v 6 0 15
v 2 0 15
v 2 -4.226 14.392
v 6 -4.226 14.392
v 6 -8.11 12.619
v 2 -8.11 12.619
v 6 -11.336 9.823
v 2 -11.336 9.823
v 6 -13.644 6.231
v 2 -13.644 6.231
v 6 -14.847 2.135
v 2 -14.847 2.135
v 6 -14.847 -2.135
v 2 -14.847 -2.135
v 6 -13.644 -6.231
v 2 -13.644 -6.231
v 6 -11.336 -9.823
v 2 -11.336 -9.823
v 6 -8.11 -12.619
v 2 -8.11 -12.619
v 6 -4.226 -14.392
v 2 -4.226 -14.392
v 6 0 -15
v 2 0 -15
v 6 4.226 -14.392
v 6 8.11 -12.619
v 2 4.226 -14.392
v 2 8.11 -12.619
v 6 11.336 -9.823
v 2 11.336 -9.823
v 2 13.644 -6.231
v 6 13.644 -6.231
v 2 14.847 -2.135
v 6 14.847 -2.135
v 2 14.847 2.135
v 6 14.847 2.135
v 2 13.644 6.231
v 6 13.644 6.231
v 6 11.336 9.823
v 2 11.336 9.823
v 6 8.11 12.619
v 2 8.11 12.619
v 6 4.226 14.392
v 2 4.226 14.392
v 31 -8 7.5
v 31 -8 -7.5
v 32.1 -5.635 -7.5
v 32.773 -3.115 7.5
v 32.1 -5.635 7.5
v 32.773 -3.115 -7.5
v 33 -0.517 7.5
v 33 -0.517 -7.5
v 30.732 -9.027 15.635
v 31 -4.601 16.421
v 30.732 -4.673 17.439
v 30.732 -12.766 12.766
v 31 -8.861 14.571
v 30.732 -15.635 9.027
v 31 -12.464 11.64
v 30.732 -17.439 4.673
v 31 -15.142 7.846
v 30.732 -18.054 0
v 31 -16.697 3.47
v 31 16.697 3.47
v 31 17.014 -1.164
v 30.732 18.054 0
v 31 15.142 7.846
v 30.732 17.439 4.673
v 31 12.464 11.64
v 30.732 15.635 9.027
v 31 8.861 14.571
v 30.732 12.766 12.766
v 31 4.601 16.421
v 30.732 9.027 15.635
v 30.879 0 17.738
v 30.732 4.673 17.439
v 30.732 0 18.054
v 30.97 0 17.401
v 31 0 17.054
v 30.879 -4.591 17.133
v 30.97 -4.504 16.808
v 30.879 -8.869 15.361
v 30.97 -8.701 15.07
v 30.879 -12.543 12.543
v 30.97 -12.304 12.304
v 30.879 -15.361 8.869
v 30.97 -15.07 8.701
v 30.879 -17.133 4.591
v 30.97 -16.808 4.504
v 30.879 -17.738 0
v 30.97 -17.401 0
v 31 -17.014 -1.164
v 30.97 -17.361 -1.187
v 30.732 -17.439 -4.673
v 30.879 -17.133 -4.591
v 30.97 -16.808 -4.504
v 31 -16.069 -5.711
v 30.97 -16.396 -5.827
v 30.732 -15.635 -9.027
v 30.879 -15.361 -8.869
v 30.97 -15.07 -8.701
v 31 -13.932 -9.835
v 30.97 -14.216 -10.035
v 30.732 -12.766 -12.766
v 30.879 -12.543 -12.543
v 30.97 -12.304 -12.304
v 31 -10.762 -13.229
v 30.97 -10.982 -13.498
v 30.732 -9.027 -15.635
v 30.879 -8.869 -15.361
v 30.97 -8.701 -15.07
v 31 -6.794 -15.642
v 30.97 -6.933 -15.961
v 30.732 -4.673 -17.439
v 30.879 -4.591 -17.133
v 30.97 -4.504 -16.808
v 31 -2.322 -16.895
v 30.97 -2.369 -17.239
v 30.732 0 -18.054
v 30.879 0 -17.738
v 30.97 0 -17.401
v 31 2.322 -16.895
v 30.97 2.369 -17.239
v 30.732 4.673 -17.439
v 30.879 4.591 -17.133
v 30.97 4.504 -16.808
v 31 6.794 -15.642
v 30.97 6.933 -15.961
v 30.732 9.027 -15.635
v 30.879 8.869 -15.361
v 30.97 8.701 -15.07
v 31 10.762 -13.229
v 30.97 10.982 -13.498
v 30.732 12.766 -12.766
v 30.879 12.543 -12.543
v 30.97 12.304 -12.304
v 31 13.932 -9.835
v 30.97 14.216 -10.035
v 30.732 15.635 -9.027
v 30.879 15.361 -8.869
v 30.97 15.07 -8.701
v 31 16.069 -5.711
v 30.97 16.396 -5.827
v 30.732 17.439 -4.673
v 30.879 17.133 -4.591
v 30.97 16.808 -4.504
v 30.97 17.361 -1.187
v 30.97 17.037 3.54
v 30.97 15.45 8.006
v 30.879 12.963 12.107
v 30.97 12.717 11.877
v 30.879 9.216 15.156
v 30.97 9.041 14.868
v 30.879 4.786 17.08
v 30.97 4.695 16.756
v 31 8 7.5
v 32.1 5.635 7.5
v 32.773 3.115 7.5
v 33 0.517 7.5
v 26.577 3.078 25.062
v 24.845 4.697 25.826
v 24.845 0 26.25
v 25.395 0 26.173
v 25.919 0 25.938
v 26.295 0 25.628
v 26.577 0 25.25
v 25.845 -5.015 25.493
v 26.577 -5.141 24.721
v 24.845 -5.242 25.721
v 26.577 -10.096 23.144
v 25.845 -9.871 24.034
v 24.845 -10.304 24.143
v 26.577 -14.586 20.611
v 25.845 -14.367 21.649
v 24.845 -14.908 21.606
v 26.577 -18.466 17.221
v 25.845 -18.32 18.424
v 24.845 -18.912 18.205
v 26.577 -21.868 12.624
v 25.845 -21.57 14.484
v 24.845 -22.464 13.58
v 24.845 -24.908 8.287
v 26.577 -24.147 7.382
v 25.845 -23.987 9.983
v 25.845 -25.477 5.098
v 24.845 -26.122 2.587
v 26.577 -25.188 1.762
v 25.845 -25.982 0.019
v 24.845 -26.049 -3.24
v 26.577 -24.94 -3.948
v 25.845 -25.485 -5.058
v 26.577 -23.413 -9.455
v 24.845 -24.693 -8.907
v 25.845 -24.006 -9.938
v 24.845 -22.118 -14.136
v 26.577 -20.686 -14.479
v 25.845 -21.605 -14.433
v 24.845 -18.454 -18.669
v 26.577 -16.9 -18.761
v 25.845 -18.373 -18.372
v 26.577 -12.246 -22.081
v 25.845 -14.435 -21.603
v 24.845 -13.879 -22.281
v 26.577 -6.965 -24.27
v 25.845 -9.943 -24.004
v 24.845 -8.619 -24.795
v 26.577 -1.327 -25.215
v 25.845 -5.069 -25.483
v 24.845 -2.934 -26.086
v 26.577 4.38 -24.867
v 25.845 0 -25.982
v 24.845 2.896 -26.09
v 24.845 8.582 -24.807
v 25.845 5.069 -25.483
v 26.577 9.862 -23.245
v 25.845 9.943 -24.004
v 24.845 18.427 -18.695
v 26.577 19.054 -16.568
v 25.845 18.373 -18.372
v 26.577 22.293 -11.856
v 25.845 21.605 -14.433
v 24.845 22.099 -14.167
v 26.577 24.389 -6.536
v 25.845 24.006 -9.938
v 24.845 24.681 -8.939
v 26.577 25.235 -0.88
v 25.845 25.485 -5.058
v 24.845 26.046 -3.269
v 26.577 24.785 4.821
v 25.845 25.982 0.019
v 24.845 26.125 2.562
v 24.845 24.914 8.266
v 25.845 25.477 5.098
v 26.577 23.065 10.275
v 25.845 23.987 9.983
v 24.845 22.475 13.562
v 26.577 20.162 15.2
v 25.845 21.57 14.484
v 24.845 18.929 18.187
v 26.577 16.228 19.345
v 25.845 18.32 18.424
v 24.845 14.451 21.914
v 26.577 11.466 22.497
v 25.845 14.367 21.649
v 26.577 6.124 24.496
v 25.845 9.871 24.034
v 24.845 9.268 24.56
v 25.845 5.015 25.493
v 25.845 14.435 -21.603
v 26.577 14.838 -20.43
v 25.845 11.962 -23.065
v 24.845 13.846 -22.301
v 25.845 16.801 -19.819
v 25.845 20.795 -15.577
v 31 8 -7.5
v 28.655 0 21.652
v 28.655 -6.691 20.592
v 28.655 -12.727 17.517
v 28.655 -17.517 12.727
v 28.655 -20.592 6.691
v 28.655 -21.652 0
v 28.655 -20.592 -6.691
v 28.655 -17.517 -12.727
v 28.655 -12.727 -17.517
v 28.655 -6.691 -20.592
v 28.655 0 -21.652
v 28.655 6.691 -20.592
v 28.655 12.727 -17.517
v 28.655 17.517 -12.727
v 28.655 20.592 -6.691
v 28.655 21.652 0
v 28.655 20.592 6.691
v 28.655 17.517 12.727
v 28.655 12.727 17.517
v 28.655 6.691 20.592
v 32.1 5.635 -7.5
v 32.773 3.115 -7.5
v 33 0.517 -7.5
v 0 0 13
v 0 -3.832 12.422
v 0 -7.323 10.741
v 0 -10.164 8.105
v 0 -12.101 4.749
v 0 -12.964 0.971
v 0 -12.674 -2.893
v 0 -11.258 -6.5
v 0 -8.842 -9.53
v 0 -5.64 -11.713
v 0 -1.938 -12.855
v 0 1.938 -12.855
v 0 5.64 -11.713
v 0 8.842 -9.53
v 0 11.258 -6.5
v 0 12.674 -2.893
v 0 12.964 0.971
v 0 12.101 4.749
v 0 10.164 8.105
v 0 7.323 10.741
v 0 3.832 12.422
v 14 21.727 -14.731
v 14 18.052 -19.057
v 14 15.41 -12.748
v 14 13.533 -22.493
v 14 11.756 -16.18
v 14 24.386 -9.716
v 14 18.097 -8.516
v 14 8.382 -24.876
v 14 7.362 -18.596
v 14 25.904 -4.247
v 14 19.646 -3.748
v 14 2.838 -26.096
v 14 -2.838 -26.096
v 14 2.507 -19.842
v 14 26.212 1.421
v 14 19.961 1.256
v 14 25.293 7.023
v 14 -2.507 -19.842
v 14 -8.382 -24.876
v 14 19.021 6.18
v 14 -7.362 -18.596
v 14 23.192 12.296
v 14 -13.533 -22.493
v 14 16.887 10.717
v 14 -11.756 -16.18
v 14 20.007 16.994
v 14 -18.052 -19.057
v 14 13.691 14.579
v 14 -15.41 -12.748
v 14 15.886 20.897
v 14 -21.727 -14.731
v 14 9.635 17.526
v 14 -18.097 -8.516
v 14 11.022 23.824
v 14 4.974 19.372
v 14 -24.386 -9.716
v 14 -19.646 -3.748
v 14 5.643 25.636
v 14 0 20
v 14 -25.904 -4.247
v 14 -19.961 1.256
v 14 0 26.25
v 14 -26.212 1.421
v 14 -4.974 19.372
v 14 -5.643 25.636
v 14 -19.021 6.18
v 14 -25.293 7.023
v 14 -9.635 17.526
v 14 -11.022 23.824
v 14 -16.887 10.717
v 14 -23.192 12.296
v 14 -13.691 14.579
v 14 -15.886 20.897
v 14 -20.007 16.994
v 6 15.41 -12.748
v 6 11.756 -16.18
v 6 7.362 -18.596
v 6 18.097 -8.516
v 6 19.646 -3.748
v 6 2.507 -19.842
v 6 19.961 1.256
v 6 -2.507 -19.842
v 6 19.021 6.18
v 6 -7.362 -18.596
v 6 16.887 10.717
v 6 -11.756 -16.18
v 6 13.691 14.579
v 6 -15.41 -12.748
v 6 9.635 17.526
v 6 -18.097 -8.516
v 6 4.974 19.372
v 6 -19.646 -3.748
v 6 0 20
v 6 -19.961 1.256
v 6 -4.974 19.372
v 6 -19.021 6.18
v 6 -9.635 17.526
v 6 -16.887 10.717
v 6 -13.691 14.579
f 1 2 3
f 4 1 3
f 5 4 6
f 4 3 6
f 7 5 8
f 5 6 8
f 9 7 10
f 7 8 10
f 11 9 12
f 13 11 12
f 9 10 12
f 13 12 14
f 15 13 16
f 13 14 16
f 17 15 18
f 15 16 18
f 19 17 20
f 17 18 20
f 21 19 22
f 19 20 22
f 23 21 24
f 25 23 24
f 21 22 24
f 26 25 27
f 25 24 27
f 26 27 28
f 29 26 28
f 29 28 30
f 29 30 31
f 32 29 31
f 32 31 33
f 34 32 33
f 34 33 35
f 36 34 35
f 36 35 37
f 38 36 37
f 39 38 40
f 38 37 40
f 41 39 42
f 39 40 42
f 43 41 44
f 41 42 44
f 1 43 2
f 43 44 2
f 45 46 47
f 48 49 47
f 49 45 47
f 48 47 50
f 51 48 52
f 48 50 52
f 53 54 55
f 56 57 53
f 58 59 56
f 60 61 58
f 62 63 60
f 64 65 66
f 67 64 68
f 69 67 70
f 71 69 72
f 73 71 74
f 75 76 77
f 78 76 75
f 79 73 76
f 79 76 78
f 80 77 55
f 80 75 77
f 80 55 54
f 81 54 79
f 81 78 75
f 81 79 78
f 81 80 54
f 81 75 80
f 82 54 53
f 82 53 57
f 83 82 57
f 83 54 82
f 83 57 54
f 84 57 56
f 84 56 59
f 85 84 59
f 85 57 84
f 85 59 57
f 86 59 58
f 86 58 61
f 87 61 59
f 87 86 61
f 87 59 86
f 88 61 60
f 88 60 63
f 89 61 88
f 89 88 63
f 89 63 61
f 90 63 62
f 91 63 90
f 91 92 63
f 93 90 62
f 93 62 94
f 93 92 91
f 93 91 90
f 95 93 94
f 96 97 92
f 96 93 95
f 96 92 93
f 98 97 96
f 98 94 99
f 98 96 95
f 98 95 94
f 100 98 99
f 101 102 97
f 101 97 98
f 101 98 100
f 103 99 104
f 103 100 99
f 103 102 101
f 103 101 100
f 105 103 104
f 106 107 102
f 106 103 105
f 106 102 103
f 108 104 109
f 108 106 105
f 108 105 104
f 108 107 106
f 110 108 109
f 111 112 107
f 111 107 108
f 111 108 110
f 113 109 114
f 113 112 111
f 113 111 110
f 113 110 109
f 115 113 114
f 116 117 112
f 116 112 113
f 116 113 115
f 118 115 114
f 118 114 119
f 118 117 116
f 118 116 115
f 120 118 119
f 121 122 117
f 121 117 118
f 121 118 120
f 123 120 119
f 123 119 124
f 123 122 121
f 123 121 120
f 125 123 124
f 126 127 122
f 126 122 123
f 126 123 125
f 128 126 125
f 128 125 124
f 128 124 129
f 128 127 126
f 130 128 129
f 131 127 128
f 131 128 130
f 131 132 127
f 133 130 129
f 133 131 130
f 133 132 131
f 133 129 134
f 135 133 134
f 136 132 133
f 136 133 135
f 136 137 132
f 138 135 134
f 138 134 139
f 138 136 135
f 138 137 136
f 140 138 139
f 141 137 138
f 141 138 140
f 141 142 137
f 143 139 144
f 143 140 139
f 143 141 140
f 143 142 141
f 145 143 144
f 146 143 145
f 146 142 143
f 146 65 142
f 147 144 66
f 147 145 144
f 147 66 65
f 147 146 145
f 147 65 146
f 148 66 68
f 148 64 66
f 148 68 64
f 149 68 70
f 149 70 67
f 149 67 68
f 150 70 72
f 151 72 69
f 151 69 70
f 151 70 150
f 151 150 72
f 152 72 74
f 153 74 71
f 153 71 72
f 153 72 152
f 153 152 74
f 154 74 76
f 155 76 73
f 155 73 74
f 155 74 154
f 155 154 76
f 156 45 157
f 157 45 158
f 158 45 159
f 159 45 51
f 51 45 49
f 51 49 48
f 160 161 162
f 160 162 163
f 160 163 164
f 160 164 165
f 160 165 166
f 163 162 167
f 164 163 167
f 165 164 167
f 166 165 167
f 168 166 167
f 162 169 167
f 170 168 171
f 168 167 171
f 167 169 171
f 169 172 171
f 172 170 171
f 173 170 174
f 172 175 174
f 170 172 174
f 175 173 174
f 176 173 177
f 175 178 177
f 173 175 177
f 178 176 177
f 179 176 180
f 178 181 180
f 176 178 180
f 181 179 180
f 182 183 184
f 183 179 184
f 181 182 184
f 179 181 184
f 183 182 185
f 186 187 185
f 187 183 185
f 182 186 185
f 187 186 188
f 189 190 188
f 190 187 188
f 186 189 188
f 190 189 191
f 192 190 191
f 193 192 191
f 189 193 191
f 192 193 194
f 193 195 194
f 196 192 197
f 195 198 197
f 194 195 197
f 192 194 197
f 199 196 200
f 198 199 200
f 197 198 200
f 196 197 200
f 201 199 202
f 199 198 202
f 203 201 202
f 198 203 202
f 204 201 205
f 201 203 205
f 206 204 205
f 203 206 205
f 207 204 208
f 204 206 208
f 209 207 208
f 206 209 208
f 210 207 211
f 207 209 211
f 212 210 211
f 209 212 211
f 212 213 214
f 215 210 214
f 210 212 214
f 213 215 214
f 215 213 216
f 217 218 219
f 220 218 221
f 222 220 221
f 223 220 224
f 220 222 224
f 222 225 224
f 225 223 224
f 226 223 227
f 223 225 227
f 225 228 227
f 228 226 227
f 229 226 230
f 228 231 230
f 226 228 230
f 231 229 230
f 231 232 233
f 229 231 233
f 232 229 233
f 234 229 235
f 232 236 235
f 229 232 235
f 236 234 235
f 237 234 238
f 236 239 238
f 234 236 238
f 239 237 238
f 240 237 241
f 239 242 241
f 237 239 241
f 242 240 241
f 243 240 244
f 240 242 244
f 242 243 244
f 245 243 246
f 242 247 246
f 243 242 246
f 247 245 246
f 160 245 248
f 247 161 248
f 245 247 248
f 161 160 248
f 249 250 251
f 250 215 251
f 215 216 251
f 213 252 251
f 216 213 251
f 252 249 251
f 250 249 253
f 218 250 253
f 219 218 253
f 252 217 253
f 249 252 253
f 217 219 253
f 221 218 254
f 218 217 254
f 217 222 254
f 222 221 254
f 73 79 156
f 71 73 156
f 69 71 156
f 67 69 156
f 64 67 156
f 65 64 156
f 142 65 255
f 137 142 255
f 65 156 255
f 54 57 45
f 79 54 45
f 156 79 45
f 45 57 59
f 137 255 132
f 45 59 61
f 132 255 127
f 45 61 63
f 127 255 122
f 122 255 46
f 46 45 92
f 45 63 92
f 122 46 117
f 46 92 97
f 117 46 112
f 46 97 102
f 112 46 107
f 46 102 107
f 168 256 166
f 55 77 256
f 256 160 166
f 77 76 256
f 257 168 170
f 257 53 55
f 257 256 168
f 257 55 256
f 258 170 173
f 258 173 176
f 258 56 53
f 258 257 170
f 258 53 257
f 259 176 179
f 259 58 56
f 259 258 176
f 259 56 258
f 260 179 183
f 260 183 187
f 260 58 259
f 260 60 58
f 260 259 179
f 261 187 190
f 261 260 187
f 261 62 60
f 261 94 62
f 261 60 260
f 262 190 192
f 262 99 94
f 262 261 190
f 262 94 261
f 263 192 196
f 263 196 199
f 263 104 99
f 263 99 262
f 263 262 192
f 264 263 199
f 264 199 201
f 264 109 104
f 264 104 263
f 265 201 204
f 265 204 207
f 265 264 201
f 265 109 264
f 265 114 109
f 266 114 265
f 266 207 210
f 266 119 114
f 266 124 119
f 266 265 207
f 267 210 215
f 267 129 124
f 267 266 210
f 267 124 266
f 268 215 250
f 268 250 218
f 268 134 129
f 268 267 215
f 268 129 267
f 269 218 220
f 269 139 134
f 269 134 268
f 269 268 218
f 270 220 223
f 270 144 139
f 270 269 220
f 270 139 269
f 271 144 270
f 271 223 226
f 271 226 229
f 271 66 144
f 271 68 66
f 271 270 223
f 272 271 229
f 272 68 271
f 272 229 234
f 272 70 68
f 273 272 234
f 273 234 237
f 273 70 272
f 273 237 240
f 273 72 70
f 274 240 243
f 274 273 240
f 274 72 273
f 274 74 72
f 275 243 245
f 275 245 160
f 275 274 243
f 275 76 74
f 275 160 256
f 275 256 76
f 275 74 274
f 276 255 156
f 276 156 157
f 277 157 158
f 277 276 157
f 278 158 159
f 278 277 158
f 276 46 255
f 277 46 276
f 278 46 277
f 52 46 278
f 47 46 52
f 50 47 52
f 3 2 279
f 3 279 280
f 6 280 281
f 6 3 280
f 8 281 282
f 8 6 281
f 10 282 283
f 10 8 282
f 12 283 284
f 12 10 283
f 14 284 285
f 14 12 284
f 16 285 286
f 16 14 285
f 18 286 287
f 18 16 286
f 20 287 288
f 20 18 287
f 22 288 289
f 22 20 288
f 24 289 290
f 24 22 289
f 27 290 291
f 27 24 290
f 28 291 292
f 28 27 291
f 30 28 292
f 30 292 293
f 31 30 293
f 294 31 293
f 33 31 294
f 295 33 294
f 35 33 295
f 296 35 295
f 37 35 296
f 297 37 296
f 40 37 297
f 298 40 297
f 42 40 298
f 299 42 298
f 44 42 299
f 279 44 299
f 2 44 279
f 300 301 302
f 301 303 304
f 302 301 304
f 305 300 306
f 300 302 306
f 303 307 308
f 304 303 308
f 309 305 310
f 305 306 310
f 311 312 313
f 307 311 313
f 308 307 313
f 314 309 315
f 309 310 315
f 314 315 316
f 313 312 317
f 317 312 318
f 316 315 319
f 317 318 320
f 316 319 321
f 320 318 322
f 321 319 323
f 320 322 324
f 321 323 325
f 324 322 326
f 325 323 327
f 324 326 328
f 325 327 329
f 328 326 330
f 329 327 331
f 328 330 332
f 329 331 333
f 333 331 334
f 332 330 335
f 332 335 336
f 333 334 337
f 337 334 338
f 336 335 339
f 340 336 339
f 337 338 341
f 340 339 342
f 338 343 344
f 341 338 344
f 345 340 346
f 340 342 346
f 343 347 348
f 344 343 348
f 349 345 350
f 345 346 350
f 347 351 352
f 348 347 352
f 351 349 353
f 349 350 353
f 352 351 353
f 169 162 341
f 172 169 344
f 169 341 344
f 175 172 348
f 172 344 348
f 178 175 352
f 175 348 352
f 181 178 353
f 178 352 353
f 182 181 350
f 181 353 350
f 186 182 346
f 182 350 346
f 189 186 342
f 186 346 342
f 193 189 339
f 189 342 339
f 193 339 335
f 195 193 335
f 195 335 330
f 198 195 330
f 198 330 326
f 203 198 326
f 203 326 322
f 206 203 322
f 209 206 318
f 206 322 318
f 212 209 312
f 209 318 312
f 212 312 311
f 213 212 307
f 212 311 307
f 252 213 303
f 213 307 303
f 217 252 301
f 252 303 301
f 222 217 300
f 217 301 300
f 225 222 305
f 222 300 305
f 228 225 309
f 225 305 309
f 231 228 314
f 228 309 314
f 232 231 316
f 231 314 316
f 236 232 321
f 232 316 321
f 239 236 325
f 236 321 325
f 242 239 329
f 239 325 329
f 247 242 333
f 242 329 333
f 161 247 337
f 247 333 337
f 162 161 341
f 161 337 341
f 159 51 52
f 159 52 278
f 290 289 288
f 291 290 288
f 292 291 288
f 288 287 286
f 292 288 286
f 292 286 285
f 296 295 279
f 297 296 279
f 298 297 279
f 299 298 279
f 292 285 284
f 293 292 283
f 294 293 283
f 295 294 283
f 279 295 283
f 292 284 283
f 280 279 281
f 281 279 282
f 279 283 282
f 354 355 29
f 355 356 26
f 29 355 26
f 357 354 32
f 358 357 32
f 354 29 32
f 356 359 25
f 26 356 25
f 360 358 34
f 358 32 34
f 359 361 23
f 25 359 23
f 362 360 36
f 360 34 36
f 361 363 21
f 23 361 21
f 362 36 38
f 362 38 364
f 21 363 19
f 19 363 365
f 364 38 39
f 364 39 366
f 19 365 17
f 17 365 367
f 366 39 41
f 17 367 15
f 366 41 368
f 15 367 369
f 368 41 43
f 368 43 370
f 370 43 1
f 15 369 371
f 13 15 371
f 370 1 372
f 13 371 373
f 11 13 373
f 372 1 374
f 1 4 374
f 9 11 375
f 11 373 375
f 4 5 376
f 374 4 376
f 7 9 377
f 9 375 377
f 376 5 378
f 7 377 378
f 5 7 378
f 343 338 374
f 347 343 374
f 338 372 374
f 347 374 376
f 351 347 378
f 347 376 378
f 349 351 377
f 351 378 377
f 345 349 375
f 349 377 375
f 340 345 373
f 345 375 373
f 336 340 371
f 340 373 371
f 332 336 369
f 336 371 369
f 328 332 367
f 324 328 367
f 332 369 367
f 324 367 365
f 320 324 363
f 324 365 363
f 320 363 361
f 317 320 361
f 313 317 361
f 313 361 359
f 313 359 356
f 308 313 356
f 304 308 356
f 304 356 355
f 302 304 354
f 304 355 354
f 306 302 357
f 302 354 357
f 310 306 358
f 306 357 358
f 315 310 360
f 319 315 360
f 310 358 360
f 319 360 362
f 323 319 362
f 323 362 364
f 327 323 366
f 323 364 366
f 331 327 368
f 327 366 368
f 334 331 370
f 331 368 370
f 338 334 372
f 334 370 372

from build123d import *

# Parameters (mm, degrees)
F3_SIZE     = 2
F4_SIZE2    = 8.6602540378
F4_SIZE     = 5
F5_R        = 2
F6_W        = 16
F6_H        = 15
F7_DEPTH    = 2
F8_T1_DEPTH = 52.4165738677


# Not quite as in the source:
# - a fillet or chamfer that OpenCascade refuses, or shapes differently, is made with other operations: its cross-section is extruded or revolved along the edge and cut away or added


with BuildPart() as f2:
    # F0 (on Front) → F2 (revolve)
    with BuildSketch(Plane.XZ):
        Polygon((0, 15), (0, 0), (31, 0), (31, 26.25), (14, 26.25), (14, 20), (6, 20), (6, 15), align=None)
    revolve(axis=Axis((43.7085926533, 0, 0), (1, 0, 0)))

    # F3
    f3_edges = [f2.edges().sort_by_distance(p)[0] for p in [
        (0, 0, -15),
    ]]
    chamfer(f3_edges, length=F3_SIZE)

    # F4
    f4_edges = [f2.edges().sort_by_distance(p)[0] for p in [
        (31, 0, -26.25),
    ]]
    chamfer(f4_edges, length=F4_SIZE, length2=F4_SIZE2)

    # F5
    f5_edges = [f2.edges().sort_by_distance(p)[0] for p in [
        (26, 0, -26.25),
        (31, 0, -17.589746),
    ]]
    fillet(f5_edges, radius=F5_R)

    # F6 (on face) → F7 (join)
    with BuildSketch(Plane.YZ.offset(31)):
        Rectangle(F6_W, F6_H)
    extrude(amount=F7_DEPTH)

    # F8: fillet of radius 15 on 2 edges, made by hand

    # F8_s2 → F8_t1 (cut)
    with BuildSketch(Plane.XY.offset(-26.2082869339)):
        with BuildLine():
            ThreePointArc((31, -8), (32.4913767462, -4.3896685727), (33, -0.5166852265))
            Line((33, -0.5166852265), (33, -8))
            Line((33, -8), (31, -8))
        make_face()
        with BuildLine():
            ThreePointArc((31, 8), (32.4913767462, 4.3896685727), (33, 0.5166852265))
            Line((33, 0.5166852265), (33, 8))
            Line((33, 8), (31, 8))
        make_face()
    extrude(amount=F8_T1_DEPTH, mode=Mode.SUBTRACT)


solid = f2.part
